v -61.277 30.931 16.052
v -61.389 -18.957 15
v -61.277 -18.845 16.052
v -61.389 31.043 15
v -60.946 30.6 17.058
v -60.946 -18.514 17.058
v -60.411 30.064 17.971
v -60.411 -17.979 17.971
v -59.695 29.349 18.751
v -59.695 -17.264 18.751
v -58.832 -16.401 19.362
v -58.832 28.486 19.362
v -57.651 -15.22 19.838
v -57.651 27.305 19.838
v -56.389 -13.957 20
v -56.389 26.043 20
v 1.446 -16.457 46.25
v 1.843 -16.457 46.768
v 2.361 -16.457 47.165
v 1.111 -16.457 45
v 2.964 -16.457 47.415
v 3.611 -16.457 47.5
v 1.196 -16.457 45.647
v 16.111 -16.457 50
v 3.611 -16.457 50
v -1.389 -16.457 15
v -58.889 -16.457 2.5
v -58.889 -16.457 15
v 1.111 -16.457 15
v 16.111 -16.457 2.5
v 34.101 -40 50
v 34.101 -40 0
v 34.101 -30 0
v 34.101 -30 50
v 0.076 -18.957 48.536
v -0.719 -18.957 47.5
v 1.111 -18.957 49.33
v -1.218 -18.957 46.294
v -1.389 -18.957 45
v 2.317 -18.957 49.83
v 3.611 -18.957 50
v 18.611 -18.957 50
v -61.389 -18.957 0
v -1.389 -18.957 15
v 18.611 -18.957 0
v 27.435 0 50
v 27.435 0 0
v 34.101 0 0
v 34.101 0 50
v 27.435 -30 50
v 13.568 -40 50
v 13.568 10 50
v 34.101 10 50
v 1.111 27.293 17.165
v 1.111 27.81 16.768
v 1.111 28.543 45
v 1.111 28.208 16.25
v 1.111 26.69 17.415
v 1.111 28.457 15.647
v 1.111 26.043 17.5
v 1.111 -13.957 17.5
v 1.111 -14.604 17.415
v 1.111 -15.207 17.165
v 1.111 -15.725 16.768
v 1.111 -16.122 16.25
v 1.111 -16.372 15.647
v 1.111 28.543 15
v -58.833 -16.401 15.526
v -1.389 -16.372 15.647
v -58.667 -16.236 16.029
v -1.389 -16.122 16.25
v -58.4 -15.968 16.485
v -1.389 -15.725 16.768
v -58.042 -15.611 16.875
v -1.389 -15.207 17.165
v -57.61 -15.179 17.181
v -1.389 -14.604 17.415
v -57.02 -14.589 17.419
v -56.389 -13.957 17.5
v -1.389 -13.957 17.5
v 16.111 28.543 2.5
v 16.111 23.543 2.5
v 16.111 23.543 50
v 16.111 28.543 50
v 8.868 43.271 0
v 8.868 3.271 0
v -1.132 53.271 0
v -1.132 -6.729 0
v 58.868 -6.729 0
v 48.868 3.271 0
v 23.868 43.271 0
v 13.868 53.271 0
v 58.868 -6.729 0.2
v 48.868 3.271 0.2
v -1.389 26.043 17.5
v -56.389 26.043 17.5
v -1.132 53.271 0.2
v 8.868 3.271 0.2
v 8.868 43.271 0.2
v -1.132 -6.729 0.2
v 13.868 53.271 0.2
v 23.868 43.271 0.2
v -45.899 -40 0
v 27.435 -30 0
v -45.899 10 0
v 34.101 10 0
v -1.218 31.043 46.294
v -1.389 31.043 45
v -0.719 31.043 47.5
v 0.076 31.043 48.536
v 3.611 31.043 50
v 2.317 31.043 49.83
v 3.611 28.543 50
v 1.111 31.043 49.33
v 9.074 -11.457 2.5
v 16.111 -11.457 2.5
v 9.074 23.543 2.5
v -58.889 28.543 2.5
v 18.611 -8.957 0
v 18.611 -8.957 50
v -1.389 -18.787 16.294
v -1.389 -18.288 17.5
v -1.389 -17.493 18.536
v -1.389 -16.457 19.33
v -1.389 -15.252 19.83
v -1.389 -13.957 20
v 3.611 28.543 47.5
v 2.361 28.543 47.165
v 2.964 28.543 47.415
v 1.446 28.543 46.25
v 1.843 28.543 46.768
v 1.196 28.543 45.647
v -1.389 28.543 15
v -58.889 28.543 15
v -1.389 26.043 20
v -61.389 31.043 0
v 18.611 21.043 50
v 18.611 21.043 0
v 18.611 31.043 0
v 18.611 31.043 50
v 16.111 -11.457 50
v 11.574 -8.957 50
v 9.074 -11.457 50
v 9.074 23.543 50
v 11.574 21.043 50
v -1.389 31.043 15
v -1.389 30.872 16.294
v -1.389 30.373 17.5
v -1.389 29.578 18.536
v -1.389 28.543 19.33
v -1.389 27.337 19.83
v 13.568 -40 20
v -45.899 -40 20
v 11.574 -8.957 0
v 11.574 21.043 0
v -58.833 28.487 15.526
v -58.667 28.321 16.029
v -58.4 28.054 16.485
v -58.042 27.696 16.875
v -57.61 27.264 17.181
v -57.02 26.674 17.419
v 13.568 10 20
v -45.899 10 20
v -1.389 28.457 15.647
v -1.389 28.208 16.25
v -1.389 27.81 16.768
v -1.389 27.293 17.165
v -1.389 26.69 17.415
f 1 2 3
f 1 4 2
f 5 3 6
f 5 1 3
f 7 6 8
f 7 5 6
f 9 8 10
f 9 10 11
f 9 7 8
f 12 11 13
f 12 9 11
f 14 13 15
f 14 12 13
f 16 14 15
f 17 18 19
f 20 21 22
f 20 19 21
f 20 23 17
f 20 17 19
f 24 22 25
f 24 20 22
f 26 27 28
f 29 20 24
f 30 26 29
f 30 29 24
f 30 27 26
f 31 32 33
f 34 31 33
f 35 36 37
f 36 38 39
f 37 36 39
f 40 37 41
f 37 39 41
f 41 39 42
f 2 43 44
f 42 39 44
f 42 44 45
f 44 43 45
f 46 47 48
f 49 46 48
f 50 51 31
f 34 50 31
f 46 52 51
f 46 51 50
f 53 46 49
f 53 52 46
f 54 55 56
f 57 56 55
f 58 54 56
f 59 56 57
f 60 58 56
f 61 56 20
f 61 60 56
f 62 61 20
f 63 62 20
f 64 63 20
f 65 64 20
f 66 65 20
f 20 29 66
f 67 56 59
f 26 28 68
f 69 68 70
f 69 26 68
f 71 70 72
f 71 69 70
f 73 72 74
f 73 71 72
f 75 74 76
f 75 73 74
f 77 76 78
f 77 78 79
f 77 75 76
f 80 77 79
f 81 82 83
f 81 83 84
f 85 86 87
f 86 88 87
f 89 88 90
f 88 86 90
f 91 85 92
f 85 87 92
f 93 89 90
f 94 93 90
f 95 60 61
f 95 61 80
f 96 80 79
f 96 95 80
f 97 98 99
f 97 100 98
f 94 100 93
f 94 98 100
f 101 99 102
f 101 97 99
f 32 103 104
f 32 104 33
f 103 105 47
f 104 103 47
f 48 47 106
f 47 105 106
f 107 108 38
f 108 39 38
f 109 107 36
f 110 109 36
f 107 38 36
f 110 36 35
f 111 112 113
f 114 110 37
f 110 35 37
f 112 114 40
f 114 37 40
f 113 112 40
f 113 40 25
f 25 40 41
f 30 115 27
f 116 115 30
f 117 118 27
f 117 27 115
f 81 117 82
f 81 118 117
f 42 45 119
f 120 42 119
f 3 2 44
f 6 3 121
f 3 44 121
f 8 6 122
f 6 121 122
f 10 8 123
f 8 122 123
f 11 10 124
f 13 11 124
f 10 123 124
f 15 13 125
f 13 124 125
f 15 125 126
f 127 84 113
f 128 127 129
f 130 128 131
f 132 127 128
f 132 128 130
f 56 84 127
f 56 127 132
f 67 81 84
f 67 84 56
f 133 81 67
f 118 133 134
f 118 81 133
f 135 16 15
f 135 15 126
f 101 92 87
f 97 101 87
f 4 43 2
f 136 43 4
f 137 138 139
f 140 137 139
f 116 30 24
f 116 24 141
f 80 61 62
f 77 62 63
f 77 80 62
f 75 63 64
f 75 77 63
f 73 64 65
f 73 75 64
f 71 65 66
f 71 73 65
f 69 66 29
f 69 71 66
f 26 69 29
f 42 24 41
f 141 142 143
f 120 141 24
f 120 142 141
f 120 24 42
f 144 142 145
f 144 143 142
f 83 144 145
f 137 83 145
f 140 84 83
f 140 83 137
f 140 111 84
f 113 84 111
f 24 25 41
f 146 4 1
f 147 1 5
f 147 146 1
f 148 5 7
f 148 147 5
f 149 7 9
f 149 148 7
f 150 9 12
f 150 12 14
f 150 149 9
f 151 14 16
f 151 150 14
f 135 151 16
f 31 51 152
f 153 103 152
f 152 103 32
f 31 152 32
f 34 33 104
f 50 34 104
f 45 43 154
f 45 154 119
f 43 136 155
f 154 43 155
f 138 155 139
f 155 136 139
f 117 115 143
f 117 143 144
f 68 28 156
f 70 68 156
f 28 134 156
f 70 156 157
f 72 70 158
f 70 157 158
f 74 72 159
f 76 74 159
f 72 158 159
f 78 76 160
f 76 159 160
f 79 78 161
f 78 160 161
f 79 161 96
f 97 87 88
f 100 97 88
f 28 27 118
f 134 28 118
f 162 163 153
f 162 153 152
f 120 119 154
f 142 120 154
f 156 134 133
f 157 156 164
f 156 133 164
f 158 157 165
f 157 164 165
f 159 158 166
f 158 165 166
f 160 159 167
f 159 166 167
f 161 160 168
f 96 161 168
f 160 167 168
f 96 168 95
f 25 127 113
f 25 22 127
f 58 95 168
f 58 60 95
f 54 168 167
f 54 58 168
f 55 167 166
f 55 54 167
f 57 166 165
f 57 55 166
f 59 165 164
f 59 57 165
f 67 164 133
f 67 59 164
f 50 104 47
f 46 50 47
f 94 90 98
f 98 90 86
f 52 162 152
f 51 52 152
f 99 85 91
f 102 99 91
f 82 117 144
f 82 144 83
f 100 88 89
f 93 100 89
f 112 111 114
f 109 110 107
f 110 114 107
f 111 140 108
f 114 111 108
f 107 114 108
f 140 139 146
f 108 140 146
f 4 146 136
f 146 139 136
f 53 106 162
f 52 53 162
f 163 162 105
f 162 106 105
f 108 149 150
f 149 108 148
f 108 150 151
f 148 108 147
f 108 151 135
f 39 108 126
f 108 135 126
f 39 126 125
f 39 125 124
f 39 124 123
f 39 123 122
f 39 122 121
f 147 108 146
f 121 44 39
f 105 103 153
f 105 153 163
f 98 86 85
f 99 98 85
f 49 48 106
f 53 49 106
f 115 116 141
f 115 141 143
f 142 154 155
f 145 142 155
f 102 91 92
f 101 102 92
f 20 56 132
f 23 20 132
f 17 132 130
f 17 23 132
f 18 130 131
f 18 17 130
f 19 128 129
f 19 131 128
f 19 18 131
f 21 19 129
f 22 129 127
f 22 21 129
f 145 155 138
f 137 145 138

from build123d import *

# Parameters (mm, degrees)
F1_DEPTH     = 0.2
F2_W         = 60
F2_H         = 50
F3_DEPTH     = 20
F4_DEPTH     = 50
F5_W         = 59.4666637367
F5_H         = 50
F6_DEPTH     = 20
F7_DEPTH     = 50
F8_R         = 5
F9_T         = 2.5
F9_T3_DEPTH  = 45
F9_T5_DEPTH  = 55
F9_T8_ANGLE  = 90.000000001
F9_T10_ANGLE = 90.000000001


# Not quite as in the source:
# - a shell that OpenCascade refuses in one call is made with other operations: the cavity is built on its own and cut out


with BuildPart() as f1:
    # F0 (on Top) → F1 (new body)
    with BuildSketch(Plane.XY):
        Polygon((23.8681607499, 43.2712367737), (13.8681607499, 53.2712367737), (-1.1318392501, 53.2712367737), (-1.1318392501, -6.7287632263), (58.8681607499, -6.7287632263), (48.8681607499, 3.2712367737), (8.8681607499, 3.2712367737), (8.8681607499, 43.2712367737), align=None)
    extrude(amount=F1_DEPTH)


with BuildPart() as f3:
    # F2 (on Top) → F3 (new body)
    with BuildSketch(Plane.XY):
        with Locations((-31.3888411792, 6.0425736521)):
            Rectangle(F2_W, F2_H)
    extrude(amount=F3_DEPTH)

    # F2 (on Top) → F4 (join)
    with BuildSketch(Plane.XY):
        Polygon((-1.3888411792, 31.0425736521), (-1.3888411792, -18.9574263479), (18.6111588208, -18.9574263479), (18.6111588208, -8.9574263479), (11.5741182365, -8.9574263479), (11.5741182365, 21.0425736521), (18.6111588208, 21.0425736521), (18.6111588208, 31.0425736521), align=None)
    extrude(amount=F4_DEPTH)

    # F8
    f8_edges = [f3.edges().sort_by_distance(p)[0] for p in [
        (-1.388841, 6.042574, 50),
        (-61.388841, 6.042574, 20),
        (-31.388841, -18.957426, 20),
        (-31.388841, 31.042574, 20),
    ]]
    fillet(f8_edges, radius=F8_R)

    # F9: shell of thickness 2.5, made by hand


with BuildPart() as f6:
    # F5 (on Top) → F6 (new body)
    with BuildSketch(Plane.XY):
        with Locations((-16.1652588892, -15)):
            Rectangle(F5_W, F5_H)
    extrude(amount=F6_DEPTH)

    # F5 (on Top) → F7 (join)
    with BuildSketch(Plane.XY):
        Polygon((13.5680729791, 10), (13.5680729791, -40), (34.1014092424, -40), (34.1014092424, -30), (27.4347461201, -30), (27.4347461201, 0), (34.1014092424, 0), (34.1014092424, 10), align=None)
    extrude(amount=F7_DEPTH)


with BuildPart() as f9_core1:
    # F9_t2: copy of F3
    add(f3.part)

    # the walls: a layer under each face that stays
    f9_faces = [f9_core1.faces().sort_by_distance(p)[0] for p in [
        (-61.3888411792, 6.0425736521, 7.5),
        (5.2778254875, 31.0425736521, 41.6666666667),
        (-59.9243750851, 6.0425736521, 18.5355339059),
        (-21.3888411792, 6.0425736521, 0),
        (-48.0555078458, -18.9574263479, 8.3333333333),
        (-31.3888411792, 29.578107558, 18.5355339059),
        (-1.3888411792, 6.0425736521, 30),
        (18.6111588208, 26.0425736521, 25),
        (0.0756249149, 6.0425736521, 48.5355339059),
        (-28.8888411792, 6.0425736521, 20),
        (-31.3888411792, -17.4929602538, 18.5355339059),
        (18.6111588208, -13.9574263479, 25),
        (15.0926385287, -8.9574263479, 25),
        (11.5741182365, 6.0425736521, 25),
        (15.0926385287, 21.0425736521, 25),
    ]]
    thicken(f9_faces, amount=-F9_T, mode=Mode.SUBTRACT)

    # F9_s4 → F9_t3 (cut)
    with BuildSketch(Plane.XZ.offset(-28.5425736521)):
        Polygon((-1.4138411792, 20.025), (1.1111588208, 20), (1.1111588208, 17.5), (-1.3888411792, 17.5), align=None)
    extrude(amount=F9_T3_DEPTH, mode=Mode.SUBTRACT)

    # F9_s6 → F9_t5 (cut)
    with BuildSketch(Plane.XY.offset(-2.5)):
        Polygon((11.5991182365, -8.9324263479), (11.5741182365, -11.4574263479), (9.0741182365, -11.4574263479), (9.0741182365, -8.9574263479), align=None)
        Polygon((11.5991182365, 21.0175736521), (9.0741182365, 21.0425736521), (9.0741182365, 23.5425736521), (11.5741182365, 23.5425736521), align=None)
    extrude(amount=F9_T5_DEPTH, mode=Mode.SUBTRACT)

    # F9_s7 → F9_t8 (revolve, cut)
    with BuildSketch(Plane.XZ.offset(-26.0425736521)):
        Polygon((-1.4138411792, 20.025), (-1.3888411792, 17.5), (1.1111588208, 17.5), (1.1111588208, 20), align=None)
    revolve(axis=Axis((-1.3888411792, 26.0425736521, 15), (-1, 0, 0)), revolution_arc=F9_T8_ANGLE, mode=Mode.SUBTRACT)

    # F9_s9 → F9_t10 (revolve, cut)
    with BuildSketch(Plane.XZ.offset(13.9574263479)):
        Polygon((-1.4138411792, 20.025), (1.1111588208, 20), (1.1111588208, 17.5), (-1.3888411792, 17.5), align=None)
    revolve(axis=Axis((-1.3888411792, -13.9574263479, 15), (1, 0, 0)), revolution_arc=F9_T10_ANGLE, mode=Mode.SUBTRACT)


with BuildPart() as f3_1:
    add(f3.part)

    # what is left inside the walls is the cavity
    f9_cavity = [f9_core1.part.solids().sort_by_distance(p)[0] for p in [
        (-21.388841, -1.457426, 2.525),
    ]]
    add(f9_cavity, mode=Mode.SUBTRACT)


solid = Compound([f1.part, f6.part, f3_1.part])
